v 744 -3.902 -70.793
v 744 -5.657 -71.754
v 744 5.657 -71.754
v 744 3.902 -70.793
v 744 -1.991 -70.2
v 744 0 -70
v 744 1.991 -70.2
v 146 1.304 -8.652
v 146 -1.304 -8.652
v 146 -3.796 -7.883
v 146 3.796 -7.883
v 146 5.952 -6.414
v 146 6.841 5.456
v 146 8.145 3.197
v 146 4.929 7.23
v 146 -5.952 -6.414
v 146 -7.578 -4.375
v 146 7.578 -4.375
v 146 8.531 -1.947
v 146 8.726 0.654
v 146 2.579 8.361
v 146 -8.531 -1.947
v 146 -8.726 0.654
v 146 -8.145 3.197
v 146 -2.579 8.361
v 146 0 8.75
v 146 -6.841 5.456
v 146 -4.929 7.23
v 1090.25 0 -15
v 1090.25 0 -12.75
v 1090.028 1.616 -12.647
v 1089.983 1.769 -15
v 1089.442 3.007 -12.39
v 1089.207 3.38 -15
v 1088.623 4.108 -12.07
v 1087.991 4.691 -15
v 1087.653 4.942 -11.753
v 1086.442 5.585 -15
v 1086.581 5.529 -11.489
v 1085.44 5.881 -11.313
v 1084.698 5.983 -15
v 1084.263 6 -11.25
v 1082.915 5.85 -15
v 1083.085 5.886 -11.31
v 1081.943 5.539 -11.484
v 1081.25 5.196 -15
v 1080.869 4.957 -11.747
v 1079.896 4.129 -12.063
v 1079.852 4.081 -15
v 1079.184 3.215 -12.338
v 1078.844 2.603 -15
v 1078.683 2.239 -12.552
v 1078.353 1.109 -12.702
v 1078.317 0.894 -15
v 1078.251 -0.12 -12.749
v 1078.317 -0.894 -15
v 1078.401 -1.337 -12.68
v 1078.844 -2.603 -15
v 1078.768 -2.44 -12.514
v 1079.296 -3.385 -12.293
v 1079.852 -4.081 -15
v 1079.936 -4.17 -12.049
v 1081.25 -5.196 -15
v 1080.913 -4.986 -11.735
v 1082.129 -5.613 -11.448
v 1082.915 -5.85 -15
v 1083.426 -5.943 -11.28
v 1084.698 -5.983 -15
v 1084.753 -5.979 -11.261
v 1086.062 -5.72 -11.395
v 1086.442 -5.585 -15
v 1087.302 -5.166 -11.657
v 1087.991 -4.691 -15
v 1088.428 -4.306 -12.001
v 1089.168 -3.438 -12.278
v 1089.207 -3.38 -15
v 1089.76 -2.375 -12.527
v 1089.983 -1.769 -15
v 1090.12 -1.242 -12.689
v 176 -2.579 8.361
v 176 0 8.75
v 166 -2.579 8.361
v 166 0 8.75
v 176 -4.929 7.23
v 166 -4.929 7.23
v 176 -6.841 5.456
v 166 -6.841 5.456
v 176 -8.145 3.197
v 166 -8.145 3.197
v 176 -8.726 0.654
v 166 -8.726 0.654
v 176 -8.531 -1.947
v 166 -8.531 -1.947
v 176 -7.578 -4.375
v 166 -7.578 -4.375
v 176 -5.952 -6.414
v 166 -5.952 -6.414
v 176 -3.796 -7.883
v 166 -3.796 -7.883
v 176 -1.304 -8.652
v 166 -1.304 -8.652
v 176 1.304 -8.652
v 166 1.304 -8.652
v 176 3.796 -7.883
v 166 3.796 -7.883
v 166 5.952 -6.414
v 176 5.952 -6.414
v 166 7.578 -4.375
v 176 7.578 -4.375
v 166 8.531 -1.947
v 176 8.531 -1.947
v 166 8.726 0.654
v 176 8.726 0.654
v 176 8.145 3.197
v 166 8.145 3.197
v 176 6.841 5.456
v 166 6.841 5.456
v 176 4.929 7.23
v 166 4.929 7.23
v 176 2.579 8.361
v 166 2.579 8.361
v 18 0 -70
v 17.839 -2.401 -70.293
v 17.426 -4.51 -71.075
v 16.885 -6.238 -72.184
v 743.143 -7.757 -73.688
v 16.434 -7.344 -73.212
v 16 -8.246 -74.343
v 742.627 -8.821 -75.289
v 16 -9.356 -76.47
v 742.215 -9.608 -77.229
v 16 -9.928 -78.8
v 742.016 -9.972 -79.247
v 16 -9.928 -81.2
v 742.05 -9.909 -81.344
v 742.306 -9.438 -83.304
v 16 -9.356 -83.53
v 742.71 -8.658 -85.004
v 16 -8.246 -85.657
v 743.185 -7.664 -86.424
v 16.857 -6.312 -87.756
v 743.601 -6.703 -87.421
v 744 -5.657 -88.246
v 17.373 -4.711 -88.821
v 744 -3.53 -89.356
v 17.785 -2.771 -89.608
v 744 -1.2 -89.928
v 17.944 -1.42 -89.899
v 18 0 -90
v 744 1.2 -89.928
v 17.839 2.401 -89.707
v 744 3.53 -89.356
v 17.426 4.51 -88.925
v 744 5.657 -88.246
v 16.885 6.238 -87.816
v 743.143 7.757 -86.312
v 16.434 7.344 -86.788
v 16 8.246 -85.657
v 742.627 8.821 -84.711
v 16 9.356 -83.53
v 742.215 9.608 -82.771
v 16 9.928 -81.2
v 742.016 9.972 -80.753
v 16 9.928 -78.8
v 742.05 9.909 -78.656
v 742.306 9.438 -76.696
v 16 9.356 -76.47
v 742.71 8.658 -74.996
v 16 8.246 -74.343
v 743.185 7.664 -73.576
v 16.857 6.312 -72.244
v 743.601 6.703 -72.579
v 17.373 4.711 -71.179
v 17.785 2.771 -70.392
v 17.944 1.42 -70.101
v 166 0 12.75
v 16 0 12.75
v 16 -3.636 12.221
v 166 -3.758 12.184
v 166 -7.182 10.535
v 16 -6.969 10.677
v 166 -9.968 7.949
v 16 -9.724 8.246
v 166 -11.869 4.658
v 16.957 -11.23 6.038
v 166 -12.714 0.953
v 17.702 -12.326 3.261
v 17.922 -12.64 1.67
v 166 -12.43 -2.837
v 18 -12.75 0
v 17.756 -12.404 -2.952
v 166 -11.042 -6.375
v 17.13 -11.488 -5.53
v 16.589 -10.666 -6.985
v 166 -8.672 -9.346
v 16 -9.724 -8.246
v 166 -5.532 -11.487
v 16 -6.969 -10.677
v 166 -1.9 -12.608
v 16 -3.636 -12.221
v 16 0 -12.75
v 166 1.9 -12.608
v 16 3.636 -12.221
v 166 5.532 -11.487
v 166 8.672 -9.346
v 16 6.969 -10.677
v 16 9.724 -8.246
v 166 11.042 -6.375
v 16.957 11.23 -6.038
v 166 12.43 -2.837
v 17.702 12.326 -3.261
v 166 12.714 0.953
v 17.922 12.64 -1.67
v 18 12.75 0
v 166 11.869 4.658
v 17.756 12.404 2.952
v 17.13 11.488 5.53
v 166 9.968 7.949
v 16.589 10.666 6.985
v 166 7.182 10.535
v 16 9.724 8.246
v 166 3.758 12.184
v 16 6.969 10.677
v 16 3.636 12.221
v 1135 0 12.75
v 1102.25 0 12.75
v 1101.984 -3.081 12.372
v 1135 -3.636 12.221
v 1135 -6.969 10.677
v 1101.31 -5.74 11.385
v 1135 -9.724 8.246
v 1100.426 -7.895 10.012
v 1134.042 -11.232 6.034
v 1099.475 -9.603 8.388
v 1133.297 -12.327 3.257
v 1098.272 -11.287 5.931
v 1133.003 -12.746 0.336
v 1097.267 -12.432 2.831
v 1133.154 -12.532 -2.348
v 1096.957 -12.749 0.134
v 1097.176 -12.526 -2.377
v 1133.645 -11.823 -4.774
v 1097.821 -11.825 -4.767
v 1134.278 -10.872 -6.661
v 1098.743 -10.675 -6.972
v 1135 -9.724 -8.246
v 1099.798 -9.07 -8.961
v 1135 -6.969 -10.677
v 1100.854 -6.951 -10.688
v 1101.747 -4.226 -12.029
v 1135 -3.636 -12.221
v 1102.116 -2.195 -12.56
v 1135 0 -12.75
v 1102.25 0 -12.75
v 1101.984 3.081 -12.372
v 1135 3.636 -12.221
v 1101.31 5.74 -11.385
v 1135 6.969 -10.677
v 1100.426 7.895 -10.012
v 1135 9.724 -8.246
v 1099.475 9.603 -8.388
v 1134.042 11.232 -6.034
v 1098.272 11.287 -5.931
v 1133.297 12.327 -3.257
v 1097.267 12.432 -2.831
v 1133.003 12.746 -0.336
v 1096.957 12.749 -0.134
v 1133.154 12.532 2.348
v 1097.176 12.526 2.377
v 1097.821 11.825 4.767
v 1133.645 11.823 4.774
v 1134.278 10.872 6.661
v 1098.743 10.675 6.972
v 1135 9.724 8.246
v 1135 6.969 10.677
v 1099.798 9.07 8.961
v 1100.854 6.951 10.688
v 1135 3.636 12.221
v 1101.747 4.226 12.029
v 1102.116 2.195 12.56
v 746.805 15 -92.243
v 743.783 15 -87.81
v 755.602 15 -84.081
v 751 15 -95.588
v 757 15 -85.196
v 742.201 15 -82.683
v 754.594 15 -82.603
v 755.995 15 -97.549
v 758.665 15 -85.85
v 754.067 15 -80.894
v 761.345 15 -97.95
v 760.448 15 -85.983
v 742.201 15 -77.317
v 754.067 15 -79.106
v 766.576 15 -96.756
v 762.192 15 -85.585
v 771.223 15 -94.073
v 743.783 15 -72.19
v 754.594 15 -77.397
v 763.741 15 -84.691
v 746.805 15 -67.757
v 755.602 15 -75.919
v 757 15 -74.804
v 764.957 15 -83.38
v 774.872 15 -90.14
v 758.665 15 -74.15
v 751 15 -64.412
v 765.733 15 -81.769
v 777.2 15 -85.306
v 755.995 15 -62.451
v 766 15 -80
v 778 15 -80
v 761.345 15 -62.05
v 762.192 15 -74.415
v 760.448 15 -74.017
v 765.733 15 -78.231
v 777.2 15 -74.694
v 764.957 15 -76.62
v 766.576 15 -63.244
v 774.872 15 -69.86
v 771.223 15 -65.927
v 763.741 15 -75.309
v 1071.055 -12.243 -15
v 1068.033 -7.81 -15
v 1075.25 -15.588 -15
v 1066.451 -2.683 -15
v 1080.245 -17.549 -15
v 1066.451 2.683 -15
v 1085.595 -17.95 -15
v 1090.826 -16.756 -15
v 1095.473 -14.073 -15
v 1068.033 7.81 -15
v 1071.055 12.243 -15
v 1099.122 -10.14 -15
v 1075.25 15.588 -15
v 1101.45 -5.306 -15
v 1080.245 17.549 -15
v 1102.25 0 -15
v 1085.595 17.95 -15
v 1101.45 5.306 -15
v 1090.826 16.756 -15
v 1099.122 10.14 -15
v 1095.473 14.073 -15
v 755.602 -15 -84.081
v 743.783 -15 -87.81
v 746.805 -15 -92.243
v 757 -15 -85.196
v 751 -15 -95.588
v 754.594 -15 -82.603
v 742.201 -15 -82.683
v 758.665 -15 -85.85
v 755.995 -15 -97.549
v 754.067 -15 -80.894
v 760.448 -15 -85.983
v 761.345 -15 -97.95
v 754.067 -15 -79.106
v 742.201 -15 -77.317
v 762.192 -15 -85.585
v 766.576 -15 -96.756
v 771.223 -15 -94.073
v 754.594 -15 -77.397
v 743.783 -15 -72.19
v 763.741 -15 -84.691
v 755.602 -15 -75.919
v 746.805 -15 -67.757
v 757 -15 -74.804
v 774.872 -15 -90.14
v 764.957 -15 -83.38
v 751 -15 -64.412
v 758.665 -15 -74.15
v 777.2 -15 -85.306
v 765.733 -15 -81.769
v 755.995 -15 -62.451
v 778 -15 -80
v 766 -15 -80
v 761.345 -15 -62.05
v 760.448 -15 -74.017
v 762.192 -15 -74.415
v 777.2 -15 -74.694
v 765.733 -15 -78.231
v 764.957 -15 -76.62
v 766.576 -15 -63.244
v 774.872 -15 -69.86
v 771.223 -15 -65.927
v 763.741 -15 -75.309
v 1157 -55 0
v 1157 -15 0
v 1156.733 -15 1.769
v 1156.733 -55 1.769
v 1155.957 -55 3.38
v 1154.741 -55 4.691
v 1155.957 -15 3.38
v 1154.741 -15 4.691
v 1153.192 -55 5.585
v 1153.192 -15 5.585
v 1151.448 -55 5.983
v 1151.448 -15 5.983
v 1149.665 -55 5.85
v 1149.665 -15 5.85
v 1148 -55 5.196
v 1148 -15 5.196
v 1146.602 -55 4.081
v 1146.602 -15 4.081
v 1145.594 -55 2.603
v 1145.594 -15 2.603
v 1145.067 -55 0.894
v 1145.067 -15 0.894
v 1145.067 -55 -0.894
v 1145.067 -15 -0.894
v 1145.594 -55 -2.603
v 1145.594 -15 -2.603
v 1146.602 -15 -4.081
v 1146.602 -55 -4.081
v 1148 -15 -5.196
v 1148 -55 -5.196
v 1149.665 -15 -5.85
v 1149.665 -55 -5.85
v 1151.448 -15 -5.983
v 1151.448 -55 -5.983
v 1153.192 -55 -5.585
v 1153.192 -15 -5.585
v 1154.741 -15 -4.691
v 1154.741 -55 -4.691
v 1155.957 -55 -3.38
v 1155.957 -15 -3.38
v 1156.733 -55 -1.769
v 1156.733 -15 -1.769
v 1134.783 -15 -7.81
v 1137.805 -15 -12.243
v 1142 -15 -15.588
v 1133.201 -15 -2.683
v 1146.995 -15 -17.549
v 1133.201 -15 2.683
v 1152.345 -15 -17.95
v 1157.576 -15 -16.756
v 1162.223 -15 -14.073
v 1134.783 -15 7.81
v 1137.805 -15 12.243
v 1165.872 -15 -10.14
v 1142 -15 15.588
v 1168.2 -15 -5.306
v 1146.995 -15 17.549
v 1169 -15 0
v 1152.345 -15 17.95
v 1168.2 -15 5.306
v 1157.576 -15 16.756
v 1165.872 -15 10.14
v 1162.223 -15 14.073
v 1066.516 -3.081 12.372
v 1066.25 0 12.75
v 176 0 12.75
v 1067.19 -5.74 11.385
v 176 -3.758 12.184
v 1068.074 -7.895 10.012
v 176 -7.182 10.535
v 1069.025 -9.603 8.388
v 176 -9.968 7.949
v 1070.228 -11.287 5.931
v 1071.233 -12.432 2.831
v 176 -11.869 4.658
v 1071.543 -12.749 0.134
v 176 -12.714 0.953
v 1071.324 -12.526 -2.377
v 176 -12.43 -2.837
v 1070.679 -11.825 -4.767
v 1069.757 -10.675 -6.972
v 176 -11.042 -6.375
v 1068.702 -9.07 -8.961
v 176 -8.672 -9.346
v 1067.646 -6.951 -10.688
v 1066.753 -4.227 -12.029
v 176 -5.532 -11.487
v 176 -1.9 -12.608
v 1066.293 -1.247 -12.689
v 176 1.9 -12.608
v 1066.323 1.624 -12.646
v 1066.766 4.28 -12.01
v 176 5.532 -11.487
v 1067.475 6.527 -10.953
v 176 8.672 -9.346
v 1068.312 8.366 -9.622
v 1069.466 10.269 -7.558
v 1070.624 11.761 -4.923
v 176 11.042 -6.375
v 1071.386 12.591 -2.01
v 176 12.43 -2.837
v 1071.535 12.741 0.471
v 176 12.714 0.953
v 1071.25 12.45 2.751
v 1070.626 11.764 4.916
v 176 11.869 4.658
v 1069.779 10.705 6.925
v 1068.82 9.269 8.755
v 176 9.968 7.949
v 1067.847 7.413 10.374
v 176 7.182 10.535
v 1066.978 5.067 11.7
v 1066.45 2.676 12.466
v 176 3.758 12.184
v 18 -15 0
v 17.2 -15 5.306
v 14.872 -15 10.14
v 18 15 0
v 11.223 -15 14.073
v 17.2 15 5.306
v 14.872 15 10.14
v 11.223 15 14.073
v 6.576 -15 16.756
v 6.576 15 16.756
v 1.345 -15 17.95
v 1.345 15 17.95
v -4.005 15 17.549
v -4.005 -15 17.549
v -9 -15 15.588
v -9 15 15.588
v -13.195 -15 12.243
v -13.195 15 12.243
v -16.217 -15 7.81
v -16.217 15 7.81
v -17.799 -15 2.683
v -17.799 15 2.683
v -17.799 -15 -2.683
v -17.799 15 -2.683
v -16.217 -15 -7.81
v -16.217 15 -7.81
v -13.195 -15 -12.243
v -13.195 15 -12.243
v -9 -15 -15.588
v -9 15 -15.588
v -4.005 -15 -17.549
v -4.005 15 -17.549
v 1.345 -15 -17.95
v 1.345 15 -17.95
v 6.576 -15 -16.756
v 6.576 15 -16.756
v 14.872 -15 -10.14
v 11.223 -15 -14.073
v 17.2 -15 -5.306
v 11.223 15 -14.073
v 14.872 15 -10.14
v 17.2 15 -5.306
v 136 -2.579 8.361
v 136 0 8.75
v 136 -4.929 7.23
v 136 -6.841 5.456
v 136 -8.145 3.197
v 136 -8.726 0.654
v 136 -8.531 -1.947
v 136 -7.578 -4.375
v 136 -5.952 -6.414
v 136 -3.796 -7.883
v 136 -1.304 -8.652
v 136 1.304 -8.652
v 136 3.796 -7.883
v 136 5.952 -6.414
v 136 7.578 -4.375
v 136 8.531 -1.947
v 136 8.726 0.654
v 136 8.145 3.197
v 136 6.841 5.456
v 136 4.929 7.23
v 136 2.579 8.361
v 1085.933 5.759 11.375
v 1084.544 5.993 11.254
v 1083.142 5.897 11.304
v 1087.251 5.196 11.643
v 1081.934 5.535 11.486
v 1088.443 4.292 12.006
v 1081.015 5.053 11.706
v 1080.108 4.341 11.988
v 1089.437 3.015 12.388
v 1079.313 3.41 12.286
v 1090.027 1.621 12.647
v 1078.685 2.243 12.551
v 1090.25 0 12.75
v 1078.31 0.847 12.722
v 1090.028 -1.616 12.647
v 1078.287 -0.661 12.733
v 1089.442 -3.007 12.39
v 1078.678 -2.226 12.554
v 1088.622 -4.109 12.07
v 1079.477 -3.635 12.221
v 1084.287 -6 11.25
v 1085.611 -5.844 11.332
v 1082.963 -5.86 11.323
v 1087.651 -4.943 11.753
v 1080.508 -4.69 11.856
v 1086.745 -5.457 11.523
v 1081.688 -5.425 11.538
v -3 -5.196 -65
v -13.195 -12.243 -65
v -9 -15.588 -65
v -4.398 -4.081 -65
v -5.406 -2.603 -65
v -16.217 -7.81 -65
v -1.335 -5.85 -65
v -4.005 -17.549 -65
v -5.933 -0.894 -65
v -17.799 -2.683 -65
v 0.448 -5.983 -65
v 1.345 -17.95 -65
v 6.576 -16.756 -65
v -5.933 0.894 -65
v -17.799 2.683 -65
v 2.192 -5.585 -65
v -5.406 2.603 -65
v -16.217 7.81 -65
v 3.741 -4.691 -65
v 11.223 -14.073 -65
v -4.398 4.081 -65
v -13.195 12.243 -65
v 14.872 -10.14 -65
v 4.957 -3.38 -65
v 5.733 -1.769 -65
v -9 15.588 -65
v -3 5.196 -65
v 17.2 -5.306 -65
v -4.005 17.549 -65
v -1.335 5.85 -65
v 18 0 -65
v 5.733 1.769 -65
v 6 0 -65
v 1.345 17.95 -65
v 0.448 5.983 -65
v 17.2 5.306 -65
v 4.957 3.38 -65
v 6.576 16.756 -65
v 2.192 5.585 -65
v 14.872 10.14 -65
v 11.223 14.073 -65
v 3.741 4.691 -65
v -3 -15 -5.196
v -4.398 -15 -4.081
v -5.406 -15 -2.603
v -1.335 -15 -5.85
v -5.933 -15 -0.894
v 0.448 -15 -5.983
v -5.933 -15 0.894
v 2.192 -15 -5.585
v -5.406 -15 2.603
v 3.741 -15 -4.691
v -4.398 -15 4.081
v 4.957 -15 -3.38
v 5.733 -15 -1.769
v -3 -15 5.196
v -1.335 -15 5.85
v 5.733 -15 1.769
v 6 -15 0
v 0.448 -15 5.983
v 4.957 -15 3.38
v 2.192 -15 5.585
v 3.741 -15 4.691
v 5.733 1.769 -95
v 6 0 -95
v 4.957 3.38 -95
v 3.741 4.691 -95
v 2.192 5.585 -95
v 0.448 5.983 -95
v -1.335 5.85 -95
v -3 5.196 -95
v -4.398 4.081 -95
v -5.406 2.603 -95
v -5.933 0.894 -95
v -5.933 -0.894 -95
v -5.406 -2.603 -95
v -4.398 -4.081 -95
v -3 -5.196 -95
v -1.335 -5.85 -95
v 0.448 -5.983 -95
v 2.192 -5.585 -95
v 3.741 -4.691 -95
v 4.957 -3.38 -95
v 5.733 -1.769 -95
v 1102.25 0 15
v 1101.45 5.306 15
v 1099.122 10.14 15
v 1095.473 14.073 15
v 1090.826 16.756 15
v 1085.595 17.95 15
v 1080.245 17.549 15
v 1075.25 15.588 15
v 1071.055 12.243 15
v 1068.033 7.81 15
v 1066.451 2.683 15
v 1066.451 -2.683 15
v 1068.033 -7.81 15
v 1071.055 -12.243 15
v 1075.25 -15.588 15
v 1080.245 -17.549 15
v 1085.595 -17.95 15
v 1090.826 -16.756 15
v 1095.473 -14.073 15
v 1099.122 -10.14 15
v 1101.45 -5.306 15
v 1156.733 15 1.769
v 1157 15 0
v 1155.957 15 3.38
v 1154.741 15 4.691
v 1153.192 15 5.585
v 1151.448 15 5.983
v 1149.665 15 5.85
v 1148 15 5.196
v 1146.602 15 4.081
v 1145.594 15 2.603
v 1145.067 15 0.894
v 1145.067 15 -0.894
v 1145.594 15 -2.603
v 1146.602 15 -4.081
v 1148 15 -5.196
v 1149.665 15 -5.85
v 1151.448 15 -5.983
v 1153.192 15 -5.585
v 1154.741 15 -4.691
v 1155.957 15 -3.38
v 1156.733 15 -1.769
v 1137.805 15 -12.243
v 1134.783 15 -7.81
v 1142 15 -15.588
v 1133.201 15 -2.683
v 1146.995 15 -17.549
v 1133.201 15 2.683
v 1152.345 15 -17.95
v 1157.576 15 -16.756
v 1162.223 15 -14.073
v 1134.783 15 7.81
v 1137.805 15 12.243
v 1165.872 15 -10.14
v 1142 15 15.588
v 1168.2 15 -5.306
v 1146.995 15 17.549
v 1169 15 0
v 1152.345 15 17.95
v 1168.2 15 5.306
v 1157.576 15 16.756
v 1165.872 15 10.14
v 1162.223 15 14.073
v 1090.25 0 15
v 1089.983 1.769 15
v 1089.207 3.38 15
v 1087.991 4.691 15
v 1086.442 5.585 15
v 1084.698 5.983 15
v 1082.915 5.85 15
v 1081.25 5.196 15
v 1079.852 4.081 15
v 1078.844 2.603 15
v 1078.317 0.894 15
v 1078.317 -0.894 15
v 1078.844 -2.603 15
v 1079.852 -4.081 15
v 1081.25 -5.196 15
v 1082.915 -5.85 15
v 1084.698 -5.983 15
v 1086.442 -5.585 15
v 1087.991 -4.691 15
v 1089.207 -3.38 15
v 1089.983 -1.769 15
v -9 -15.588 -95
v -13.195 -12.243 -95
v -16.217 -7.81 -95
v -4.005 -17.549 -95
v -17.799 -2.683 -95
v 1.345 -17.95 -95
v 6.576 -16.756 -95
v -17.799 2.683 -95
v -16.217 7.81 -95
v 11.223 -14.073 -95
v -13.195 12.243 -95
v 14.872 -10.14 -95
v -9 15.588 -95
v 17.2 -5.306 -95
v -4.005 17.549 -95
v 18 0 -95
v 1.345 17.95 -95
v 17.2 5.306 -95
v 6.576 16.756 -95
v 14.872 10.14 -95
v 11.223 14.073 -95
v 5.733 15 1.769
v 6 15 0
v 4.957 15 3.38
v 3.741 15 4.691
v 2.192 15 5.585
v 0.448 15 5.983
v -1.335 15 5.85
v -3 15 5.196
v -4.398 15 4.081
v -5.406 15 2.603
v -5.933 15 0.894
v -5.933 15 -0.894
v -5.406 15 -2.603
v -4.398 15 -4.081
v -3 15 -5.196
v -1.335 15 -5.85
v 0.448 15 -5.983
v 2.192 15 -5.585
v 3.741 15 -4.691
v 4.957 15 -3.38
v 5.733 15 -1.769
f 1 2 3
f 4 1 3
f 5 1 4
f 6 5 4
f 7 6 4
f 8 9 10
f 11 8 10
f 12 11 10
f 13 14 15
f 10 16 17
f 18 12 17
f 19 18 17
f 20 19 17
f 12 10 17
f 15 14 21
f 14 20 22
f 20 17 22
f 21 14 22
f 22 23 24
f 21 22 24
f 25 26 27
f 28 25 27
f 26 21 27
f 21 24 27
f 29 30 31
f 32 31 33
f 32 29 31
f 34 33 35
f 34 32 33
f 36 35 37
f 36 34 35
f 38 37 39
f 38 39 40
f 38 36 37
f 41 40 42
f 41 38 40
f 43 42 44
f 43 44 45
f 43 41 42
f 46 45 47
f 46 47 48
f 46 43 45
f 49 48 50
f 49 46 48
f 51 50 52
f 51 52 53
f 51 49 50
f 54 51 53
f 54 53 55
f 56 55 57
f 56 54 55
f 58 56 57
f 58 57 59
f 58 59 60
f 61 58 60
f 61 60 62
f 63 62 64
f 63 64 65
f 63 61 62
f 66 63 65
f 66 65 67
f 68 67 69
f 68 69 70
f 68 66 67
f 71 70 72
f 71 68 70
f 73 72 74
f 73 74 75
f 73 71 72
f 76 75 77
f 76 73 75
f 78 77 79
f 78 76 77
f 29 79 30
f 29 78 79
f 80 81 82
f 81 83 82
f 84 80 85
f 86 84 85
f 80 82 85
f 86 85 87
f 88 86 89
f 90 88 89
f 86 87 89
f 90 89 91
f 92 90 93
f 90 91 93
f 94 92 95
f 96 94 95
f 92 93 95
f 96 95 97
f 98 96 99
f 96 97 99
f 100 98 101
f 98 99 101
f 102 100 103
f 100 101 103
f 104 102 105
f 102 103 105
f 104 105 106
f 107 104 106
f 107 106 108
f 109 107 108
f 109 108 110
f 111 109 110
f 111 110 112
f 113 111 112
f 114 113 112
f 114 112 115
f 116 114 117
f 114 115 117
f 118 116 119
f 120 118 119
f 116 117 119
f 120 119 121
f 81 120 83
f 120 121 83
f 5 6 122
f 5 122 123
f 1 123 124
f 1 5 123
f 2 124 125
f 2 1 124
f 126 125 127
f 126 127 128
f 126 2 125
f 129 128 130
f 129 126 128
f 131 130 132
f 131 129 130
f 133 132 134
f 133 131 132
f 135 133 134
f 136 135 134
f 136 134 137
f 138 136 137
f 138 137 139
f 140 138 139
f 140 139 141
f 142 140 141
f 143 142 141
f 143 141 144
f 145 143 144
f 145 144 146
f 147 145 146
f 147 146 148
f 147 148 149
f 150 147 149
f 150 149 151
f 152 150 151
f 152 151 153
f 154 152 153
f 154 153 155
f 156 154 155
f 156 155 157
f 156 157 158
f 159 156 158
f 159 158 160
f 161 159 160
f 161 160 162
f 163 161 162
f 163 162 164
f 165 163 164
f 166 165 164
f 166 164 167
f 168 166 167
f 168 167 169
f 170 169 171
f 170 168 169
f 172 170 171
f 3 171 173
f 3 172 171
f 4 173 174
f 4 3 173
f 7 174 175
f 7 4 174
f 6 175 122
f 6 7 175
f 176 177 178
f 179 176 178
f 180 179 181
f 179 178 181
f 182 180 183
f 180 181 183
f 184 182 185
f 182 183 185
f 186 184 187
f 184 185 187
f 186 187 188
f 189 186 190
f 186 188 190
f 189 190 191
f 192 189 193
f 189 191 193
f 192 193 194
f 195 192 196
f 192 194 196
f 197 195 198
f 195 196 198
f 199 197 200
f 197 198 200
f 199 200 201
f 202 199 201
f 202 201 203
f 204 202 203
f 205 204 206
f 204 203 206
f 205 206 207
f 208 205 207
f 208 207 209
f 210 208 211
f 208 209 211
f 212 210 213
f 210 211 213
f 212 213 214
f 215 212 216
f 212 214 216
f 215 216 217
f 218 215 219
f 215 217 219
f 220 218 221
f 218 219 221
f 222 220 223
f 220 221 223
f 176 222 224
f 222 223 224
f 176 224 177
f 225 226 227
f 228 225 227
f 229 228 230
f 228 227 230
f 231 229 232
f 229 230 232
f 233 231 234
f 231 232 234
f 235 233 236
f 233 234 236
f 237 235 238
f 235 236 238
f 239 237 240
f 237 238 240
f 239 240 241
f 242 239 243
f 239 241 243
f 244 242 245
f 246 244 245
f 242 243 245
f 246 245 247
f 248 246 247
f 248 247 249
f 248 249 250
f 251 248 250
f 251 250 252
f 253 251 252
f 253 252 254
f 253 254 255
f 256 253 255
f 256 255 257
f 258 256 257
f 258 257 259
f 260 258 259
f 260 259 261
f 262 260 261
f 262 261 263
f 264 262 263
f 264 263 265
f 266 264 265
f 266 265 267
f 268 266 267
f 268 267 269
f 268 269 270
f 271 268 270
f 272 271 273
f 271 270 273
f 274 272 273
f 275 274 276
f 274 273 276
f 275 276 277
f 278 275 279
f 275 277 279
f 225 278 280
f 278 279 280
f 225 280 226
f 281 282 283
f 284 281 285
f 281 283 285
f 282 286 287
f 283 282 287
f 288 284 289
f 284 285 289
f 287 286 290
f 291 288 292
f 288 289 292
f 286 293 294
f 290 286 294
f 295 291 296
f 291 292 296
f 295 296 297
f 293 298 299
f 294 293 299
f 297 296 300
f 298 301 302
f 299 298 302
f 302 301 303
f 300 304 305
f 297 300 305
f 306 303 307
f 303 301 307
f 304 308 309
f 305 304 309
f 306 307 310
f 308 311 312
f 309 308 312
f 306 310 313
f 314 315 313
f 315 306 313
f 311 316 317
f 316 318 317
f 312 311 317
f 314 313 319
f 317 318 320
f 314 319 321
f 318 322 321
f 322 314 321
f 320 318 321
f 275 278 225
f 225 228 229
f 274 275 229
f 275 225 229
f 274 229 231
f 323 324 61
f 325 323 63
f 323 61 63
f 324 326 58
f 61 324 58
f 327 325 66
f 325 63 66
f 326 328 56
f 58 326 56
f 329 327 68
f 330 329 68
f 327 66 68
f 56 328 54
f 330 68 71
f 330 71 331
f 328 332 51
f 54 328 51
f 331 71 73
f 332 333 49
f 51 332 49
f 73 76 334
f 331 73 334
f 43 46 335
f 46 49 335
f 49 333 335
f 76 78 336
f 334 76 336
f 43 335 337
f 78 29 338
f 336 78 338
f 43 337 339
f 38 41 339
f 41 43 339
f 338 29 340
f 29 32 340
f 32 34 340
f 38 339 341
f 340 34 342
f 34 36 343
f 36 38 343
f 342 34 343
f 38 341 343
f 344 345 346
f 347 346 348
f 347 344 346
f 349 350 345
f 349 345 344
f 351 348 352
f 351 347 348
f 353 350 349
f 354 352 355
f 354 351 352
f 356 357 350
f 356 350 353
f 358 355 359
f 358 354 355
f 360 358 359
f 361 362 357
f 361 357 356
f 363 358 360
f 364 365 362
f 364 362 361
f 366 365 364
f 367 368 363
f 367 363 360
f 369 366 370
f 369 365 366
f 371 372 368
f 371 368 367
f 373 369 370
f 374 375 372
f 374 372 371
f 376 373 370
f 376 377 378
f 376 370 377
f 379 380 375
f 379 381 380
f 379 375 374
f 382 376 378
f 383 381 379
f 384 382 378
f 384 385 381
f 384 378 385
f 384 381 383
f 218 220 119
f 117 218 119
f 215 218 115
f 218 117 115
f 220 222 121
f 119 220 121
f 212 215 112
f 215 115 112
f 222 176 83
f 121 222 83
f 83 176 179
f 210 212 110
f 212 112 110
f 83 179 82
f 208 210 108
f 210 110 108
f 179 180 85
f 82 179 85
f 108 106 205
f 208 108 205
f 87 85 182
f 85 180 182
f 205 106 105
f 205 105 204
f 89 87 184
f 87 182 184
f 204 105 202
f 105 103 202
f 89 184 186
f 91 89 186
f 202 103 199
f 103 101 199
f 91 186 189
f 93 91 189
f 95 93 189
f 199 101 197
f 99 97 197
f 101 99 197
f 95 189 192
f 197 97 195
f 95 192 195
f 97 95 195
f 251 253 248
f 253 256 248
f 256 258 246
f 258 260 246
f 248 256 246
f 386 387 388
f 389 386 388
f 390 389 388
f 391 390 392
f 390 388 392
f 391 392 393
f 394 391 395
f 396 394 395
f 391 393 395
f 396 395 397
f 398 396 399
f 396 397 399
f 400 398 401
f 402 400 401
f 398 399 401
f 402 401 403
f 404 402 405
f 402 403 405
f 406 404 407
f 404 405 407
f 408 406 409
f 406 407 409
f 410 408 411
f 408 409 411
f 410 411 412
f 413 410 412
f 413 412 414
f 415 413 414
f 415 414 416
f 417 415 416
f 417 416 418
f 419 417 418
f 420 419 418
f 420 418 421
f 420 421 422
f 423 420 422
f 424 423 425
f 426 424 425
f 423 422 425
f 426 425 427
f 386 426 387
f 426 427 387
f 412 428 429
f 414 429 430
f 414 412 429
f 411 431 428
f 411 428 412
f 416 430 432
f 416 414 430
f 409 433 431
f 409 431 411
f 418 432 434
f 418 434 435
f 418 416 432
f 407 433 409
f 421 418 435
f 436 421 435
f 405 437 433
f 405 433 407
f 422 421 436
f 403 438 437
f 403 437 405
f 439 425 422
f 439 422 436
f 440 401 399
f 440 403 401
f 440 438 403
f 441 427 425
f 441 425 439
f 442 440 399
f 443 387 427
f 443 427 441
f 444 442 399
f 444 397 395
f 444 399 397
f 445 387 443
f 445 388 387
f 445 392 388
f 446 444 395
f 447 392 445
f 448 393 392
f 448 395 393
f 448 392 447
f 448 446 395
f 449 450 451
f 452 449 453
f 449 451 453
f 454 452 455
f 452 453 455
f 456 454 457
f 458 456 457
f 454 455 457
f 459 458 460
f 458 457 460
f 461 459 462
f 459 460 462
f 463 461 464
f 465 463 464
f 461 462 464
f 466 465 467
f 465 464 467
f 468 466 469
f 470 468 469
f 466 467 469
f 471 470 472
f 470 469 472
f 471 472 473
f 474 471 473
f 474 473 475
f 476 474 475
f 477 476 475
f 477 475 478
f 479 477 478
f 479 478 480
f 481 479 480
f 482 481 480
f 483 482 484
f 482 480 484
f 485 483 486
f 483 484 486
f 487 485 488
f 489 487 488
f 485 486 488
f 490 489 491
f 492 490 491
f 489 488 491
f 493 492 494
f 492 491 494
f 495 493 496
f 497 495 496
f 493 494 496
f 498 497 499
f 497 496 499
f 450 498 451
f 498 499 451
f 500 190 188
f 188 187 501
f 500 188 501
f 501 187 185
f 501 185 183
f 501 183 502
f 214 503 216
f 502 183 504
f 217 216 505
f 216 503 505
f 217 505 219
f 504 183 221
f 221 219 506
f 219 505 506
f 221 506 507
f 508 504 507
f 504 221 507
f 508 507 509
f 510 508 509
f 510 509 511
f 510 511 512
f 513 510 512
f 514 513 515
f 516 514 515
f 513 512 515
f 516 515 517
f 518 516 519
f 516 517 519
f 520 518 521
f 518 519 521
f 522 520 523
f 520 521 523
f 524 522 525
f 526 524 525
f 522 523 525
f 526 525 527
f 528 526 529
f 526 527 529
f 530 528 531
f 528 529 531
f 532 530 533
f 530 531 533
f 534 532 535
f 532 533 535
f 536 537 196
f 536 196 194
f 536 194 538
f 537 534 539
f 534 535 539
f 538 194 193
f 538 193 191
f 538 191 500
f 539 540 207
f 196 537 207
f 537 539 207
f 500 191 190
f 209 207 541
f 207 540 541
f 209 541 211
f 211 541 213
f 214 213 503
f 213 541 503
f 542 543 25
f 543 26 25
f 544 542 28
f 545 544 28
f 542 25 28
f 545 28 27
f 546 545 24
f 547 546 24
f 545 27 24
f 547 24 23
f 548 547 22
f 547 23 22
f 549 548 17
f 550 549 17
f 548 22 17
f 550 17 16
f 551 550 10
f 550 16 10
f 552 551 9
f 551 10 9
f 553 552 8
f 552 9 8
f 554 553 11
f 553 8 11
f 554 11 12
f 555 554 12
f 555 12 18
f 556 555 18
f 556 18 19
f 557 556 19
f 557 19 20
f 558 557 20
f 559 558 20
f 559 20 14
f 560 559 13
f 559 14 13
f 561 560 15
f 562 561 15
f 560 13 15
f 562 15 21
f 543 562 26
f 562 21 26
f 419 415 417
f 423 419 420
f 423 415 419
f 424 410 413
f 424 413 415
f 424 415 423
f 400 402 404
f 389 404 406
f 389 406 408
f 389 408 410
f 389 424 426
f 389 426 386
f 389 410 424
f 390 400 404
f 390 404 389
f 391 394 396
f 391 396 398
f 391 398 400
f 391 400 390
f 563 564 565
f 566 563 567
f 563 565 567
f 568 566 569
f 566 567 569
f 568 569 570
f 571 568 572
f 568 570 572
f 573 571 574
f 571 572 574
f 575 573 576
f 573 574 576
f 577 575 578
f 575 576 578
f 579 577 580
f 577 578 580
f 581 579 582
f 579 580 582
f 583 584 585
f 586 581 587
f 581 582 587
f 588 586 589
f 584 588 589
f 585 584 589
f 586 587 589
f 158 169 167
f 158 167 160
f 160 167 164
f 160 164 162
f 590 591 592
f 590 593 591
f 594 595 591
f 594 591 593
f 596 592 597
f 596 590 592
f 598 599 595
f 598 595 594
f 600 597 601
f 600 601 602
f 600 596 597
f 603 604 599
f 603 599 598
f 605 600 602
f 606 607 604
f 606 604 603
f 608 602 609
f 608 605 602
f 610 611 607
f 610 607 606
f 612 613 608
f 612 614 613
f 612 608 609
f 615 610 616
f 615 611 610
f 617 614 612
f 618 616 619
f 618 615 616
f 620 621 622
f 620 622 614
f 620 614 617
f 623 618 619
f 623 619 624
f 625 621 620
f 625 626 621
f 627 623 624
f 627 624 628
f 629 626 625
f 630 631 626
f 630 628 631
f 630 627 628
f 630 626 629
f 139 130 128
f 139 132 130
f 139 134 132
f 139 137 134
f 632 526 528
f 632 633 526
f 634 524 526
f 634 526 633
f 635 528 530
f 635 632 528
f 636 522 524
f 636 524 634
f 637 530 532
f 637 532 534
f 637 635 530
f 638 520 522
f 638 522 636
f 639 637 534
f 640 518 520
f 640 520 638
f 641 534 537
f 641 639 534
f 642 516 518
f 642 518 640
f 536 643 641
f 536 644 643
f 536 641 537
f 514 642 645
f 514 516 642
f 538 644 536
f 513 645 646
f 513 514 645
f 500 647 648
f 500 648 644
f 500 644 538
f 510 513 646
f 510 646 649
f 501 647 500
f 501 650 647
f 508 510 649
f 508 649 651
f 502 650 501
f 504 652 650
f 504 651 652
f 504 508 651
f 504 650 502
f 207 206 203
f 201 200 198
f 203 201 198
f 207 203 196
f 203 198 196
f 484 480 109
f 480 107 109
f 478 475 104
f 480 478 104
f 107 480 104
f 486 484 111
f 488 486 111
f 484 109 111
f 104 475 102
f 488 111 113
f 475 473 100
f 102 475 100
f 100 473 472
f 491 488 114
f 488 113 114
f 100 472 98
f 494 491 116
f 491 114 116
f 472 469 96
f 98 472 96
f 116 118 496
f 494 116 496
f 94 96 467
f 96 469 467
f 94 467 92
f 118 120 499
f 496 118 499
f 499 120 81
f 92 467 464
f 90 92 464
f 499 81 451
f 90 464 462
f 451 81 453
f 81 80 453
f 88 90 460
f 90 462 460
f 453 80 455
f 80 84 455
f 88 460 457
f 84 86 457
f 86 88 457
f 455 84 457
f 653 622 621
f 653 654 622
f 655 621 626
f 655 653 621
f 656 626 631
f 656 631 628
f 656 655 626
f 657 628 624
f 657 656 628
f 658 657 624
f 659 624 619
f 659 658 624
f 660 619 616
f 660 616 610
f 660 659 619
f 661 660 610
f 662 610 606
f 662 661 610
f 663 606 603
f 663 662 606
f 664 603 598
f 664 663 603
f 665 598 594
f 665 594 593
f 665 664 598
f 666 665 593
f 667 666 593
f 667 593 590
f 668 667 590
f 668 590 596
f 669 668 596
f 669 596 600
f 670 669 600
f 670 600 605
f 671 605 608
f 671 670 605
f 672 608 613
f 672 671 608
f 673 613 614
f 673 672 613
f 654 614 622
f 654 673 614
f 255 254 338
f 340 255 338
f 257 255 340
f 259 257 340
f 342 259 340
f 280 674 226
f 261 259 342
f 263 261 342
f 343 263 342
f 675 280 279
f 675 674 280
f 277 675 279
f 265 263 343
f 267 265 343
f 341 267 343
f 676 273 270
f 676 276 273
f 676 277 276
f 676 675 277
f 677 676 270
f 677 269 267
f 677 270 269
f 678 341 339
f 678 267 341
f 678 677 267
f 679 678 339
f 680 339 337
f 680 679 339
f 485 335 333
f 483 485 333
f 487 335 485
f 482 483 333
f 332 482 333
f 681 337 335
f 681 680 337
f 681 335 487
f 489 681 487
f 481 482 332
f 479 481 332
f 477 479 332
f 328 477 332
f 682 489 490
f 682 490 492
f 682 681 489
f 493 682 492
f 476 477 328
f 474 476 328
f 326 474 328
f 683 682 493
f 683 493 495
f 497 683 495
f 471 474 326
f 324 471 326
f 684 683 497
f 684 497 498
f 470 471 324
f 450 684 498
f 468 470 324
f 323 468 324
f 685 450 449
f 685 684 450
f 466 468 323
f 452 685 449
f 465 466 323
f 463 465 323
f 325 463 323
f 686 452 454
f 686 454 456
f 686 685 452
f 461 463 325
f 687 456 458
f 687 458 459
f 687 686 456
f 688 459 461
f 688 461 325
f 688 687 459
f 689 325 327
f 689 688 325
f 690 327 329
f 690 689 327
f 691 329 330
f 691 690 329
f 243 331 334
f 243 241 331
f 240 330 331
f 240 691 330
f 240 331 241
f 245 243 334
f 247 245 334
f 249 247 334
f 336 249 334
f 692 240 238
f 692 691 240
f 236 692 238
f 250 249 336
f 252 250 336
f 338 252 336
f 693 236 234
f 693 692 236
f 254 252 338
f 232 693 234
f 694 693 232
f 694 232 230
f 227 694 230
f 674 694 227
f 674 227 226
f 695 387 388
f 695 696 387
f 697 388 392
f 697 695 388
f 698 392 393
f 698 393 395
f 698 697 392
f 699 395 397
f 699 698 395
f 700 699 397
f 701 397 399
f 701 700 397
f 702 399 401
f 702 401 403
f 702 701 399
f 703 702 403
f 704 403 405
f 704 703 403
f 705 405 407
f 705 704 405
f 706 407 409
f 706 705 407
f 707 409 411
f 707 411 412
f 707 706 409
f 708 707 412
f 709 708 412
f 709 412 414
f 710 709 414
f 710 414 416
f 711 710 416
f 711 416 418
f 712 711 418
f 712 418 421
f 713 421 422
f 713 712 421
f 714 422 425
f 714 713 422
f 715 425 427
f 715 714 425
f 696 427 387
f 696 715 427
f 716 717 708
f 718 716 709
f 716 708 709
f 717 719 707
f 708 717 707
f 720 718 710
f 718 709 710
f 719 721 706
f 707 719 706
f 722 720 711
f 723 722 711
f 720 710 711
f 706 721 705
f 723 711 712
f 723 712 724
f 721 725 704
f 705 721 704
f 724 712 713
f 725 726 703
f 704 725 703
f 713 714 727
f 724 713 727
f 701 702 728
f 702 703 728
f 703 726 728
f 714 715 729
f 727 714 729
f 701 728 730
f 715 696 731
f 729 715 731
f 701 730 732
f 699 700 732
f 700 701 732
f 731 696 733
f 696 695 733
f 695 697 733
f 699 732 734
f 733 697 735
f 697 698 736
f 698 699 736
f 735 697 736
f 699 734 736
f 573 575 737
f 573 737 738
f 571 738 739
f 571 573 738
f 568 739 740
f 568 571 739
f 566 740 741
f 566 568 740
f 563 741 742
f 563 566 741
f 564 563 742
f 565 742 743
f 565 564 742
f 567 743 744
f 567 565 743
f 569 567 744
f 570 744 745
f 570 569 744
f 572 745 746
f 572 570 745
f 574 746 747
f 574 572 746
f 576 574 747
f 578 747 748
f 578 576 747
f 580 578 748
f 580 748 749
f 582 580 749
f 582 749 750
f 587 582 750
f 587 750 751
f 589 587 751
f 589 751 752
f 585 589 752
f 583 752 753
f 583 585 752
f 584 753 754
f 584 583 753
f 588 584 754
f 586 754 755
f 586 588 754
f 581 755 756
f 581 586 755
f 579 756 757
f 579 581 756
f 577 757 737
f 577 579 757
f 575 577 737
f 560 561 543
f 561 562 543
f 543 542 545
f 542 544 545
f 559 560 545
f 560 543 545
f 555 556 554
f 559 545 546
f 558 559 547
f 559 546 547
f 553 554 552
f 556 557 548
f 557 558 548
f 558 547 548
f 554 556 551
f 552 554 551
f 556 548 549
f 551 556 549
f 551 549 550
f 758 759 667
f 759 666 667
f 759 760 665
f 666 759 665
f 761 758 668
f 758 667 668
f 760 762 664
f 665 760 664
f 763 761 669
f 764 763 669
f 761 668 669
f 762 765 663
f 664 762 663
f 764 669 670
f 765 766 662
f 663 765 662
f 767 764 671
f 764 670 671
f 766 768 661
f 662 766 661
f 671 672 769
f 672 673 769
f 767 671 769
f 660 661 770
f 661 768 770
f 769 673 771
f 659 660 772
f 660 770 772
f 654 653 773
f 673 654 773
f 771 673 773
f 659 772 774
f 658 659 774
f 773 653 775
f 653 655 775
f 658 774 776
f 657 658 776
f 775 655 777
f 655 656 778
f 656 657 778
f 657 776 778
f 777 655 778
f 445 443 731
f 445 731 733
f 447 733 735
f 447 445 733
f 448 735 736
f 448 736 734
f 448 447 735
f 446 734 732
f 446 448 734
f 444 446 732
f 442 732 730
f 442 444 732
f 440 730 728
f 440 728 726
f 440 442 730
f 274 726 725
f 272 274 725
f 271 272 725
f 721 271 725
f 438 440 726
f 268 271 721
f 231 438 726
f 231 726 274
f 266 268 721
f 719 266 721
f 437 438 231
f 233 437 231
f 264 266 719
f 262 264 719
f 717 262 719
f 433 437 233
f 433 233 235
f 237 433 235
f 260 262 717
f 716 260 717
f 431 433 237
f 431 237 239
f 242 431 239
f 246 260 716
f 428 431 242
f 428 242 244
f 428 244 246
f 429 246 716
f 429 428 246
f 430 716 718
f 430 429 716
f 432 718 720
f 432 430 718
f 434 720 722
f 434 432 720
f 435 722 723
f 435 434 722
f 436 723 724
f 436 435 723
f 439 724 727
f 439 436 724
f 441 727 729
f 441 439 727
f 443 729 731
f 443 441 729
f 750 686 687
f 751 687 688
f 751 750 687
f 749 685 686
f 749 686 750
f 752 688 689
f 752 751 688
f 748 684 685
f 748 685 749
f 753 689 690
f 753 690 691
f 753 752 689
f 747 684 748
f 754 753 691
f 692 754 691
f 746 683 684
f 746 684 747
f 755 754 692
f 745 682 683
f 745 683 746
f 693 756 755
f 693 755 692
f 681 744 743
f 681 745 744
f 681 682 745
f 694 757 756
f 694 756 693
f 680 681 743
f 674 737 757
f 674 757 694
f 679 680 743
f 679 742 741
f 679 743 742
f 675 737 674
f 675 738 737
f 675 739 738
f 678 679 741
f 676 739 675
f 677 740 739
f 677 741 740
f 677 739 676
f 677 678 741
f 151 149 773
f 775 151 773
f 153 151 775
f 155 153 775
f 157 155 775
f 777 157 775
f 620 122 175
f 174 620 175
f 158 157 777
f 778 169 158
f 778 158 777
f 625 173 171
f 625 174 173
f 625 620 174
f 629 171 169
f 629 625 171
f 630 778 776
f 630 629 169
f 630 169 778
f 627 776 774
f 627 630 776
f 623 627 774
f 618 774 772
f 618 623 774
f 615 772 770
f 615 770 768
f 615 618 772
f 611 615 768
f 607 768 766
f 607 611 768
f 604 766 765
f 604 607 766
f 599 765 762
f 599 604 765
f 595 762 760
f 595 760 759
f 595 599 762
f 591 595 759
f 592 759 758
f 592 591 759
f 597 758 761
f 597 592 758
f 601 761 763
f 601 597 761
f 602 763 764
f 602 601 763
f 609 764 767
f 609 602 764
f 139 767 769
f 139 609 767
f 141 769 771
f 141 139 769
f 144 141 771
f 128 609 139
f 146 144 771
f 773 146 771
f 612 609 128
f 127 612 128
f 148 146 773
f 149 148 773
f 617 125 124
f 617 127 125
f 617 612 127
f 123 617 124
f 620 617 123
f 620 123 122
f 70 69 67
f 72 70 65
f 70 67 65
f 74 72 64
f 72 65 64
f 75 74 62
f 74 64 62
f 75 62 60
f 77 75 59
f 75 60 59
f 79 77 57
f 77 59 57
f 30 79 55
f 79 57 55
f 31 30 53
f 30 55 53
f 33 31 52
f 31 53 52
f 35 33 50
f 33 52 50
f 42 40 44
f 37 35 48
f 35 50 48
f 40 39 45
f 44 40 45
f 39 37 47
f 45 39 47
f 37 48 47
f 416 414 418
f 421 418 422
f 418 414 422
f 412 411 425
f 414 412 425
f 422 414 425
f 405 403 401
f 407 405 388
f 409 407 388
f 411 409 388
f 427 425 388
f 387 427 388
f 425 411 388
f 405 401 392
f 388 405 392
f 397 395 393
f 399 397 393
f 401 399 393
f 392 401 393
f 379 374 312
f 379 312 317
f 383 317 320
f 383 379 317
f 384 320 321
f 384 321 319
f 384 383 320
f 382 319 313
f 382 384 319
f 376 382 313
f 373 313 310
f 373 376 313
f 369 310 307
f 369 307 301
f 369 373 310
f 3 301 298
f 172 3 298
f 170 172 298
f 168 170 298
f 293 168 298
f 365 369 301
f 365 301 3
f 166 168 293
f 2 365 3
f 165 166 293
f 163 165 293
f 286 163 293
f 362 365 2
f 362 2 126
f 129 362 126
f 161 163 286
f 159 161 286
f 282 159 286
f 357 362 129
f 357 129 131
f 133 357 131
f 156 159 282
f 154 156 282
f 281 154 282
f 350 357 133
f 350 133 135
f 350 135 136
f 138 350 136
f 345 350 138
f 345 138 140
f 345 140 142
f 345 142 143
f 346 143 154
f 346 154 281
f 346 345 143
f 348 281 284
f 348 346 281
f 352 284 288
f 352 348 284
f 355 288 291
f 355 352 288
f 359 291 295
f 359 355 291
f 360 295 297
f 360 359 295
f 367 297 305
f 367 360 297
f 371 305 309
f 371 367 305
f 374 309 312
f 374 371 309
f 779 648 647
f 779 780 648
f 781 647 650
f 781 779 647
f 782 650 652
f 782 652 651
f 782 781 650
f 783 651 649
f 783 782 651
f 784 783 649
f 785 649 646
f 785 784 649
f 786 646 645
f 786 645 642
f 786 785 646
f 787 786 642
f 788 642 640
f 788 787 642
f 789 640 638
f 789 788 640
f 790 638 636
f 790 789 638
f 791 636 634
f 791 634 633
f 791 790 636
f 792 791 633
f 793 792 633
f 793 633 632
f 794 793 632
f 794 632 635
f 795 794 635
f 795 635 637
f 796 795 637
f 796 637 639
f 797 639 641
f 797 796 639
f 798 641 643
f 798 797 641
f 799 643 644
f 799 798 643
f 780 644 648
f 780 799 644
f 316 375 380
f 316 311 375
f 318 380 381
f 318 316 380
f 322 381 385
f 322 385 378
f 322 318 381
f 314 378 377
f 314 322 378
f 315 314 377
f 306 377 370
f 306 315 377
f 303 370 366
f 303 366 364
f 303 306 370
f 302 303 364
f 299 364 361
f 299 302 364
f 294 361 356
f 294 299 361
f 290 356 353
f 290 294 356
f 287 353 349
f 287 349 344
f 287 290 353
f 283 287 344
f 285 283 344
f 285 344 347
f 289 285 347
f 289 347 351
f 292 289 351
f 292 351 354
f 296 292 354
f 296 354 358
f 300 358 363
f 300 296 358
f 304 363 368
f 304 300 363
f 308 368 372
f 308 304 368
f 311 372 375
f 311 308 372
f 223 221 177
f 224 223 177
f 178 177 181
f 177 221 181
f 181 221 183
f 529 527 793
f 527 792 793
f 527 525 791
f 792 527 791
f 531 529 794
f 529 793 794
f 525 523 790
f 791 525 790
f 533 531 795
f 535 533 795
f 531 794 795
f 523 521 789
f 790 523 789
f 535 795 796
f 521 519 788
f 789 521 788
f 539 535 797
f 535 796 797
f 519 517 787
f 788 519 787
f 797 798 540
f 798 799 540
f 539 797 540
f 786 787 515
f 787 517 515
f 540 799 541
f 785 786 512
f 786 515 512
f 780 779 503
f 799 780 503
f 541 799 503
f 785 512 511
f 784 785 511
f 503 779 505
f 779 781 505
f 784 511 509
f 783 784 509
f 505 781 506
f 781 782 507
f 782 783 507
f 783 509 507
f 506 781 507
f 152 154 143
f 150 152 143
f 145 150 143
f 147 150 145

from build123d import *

# Parameters (mm, degrees)
F2_R      = 18
F2_R_2    = 6
F3_DEPTH  = 15
F4_R      = 6
F5_DEPTH  = 40
F6_W      = 728
F6_H      = 10
F8_R      = 18
F8_R_2    = 6
F9_DEPTH  = 15
F11_R     = 18
F11_R_2   = 6
F12_DEPTH = 15
F13_R     = 18
F13_R_2   = 6
F14_DEPTH = 15


with BuildPart() as f1:
    # F0 (on Front) → F1 (revolve)
    with BuildSketch(Plane.XZ):
        Polygon((16, 12.75), (16, 0), (136, 0), (136, 8.75), (146, 8.75), (166, 8.75), (166, 12.75), align=None)
        Polygon((146, 8.75), (146, 0), (156, 0), (166, 0), (1135, 0), (1135, 12.75), (176, 12.75), (176, 8.75), (166, 8.75), align=None)
    revolve(axis=Axis((575.5, 0, 0), (1, 0, 0)))

    # F2 (on Front) → F3 (join, symmetric)
    with BuildSketch(Plane.XZ):
        Circle(F2_R)
        Circle(F2_R_2, mode=Mode.SUBTRACT)
        with Locations((1151, 0)):
            Circle(F2_R)
        with Locations((1151, 0)):
            Circle(F2_R_2, mode=Mode.SUBTRACT)
    extrude(amount=F3_DEPTH, both=True)

    # F13 (on Top) → F14 (join, symmetric)
    with BuildSketch(Plane.XY):
        with Locations((1084.25, 0)):
            Circle(F13_R)
        with Locations((1084.25, 0)):
            Circle(F13_R_2, mode=Mode.SUBTRACT)
    extrude(amount=F14_DEPTH, both=True)


with BuildPart() as f5:
    # F4 (on face) → F5 (new body)
    with BuildSketch(Plane.XZ.offset(15)):
        with Locations((1151, 0)):
            Circle(F4_R)
    extrude(amount=F5_DEPTH)


with BuildPart() as f7:
    # F6 (on Front) → F7 (revolve)
    with BuildSketch(Plane.XZ):
        with Locations((380, -75)):
            Rectangle(F6_W, F6_H)
    revolve(axis=Axis((380, 0, -80), (1, 0, 0)))

    # F8 (on Front) → F9 (join, symmetric)
    with BuildSketch(Plane.XZ):
        with Locations((760, -80)):
            Circle(F8_R)
        with Locations((760, -80)):
            Circle(F8_R_2, mode=Mode.SUBTRACT)
    extrude(amount=F9_DEPTH, both=True)

    # F11 (on offset) → F12 (join, symmetric)
    with BuildSketch(Plane.XY.offset(-80)):
        Circle(F11_R)
        Circle(F11_R_2, mode=Mode.SUBTRACT)
    extrude(amount=F12_DEPTH, both=True)


solid = Compound([f1.part, f5.part, f7.part])
